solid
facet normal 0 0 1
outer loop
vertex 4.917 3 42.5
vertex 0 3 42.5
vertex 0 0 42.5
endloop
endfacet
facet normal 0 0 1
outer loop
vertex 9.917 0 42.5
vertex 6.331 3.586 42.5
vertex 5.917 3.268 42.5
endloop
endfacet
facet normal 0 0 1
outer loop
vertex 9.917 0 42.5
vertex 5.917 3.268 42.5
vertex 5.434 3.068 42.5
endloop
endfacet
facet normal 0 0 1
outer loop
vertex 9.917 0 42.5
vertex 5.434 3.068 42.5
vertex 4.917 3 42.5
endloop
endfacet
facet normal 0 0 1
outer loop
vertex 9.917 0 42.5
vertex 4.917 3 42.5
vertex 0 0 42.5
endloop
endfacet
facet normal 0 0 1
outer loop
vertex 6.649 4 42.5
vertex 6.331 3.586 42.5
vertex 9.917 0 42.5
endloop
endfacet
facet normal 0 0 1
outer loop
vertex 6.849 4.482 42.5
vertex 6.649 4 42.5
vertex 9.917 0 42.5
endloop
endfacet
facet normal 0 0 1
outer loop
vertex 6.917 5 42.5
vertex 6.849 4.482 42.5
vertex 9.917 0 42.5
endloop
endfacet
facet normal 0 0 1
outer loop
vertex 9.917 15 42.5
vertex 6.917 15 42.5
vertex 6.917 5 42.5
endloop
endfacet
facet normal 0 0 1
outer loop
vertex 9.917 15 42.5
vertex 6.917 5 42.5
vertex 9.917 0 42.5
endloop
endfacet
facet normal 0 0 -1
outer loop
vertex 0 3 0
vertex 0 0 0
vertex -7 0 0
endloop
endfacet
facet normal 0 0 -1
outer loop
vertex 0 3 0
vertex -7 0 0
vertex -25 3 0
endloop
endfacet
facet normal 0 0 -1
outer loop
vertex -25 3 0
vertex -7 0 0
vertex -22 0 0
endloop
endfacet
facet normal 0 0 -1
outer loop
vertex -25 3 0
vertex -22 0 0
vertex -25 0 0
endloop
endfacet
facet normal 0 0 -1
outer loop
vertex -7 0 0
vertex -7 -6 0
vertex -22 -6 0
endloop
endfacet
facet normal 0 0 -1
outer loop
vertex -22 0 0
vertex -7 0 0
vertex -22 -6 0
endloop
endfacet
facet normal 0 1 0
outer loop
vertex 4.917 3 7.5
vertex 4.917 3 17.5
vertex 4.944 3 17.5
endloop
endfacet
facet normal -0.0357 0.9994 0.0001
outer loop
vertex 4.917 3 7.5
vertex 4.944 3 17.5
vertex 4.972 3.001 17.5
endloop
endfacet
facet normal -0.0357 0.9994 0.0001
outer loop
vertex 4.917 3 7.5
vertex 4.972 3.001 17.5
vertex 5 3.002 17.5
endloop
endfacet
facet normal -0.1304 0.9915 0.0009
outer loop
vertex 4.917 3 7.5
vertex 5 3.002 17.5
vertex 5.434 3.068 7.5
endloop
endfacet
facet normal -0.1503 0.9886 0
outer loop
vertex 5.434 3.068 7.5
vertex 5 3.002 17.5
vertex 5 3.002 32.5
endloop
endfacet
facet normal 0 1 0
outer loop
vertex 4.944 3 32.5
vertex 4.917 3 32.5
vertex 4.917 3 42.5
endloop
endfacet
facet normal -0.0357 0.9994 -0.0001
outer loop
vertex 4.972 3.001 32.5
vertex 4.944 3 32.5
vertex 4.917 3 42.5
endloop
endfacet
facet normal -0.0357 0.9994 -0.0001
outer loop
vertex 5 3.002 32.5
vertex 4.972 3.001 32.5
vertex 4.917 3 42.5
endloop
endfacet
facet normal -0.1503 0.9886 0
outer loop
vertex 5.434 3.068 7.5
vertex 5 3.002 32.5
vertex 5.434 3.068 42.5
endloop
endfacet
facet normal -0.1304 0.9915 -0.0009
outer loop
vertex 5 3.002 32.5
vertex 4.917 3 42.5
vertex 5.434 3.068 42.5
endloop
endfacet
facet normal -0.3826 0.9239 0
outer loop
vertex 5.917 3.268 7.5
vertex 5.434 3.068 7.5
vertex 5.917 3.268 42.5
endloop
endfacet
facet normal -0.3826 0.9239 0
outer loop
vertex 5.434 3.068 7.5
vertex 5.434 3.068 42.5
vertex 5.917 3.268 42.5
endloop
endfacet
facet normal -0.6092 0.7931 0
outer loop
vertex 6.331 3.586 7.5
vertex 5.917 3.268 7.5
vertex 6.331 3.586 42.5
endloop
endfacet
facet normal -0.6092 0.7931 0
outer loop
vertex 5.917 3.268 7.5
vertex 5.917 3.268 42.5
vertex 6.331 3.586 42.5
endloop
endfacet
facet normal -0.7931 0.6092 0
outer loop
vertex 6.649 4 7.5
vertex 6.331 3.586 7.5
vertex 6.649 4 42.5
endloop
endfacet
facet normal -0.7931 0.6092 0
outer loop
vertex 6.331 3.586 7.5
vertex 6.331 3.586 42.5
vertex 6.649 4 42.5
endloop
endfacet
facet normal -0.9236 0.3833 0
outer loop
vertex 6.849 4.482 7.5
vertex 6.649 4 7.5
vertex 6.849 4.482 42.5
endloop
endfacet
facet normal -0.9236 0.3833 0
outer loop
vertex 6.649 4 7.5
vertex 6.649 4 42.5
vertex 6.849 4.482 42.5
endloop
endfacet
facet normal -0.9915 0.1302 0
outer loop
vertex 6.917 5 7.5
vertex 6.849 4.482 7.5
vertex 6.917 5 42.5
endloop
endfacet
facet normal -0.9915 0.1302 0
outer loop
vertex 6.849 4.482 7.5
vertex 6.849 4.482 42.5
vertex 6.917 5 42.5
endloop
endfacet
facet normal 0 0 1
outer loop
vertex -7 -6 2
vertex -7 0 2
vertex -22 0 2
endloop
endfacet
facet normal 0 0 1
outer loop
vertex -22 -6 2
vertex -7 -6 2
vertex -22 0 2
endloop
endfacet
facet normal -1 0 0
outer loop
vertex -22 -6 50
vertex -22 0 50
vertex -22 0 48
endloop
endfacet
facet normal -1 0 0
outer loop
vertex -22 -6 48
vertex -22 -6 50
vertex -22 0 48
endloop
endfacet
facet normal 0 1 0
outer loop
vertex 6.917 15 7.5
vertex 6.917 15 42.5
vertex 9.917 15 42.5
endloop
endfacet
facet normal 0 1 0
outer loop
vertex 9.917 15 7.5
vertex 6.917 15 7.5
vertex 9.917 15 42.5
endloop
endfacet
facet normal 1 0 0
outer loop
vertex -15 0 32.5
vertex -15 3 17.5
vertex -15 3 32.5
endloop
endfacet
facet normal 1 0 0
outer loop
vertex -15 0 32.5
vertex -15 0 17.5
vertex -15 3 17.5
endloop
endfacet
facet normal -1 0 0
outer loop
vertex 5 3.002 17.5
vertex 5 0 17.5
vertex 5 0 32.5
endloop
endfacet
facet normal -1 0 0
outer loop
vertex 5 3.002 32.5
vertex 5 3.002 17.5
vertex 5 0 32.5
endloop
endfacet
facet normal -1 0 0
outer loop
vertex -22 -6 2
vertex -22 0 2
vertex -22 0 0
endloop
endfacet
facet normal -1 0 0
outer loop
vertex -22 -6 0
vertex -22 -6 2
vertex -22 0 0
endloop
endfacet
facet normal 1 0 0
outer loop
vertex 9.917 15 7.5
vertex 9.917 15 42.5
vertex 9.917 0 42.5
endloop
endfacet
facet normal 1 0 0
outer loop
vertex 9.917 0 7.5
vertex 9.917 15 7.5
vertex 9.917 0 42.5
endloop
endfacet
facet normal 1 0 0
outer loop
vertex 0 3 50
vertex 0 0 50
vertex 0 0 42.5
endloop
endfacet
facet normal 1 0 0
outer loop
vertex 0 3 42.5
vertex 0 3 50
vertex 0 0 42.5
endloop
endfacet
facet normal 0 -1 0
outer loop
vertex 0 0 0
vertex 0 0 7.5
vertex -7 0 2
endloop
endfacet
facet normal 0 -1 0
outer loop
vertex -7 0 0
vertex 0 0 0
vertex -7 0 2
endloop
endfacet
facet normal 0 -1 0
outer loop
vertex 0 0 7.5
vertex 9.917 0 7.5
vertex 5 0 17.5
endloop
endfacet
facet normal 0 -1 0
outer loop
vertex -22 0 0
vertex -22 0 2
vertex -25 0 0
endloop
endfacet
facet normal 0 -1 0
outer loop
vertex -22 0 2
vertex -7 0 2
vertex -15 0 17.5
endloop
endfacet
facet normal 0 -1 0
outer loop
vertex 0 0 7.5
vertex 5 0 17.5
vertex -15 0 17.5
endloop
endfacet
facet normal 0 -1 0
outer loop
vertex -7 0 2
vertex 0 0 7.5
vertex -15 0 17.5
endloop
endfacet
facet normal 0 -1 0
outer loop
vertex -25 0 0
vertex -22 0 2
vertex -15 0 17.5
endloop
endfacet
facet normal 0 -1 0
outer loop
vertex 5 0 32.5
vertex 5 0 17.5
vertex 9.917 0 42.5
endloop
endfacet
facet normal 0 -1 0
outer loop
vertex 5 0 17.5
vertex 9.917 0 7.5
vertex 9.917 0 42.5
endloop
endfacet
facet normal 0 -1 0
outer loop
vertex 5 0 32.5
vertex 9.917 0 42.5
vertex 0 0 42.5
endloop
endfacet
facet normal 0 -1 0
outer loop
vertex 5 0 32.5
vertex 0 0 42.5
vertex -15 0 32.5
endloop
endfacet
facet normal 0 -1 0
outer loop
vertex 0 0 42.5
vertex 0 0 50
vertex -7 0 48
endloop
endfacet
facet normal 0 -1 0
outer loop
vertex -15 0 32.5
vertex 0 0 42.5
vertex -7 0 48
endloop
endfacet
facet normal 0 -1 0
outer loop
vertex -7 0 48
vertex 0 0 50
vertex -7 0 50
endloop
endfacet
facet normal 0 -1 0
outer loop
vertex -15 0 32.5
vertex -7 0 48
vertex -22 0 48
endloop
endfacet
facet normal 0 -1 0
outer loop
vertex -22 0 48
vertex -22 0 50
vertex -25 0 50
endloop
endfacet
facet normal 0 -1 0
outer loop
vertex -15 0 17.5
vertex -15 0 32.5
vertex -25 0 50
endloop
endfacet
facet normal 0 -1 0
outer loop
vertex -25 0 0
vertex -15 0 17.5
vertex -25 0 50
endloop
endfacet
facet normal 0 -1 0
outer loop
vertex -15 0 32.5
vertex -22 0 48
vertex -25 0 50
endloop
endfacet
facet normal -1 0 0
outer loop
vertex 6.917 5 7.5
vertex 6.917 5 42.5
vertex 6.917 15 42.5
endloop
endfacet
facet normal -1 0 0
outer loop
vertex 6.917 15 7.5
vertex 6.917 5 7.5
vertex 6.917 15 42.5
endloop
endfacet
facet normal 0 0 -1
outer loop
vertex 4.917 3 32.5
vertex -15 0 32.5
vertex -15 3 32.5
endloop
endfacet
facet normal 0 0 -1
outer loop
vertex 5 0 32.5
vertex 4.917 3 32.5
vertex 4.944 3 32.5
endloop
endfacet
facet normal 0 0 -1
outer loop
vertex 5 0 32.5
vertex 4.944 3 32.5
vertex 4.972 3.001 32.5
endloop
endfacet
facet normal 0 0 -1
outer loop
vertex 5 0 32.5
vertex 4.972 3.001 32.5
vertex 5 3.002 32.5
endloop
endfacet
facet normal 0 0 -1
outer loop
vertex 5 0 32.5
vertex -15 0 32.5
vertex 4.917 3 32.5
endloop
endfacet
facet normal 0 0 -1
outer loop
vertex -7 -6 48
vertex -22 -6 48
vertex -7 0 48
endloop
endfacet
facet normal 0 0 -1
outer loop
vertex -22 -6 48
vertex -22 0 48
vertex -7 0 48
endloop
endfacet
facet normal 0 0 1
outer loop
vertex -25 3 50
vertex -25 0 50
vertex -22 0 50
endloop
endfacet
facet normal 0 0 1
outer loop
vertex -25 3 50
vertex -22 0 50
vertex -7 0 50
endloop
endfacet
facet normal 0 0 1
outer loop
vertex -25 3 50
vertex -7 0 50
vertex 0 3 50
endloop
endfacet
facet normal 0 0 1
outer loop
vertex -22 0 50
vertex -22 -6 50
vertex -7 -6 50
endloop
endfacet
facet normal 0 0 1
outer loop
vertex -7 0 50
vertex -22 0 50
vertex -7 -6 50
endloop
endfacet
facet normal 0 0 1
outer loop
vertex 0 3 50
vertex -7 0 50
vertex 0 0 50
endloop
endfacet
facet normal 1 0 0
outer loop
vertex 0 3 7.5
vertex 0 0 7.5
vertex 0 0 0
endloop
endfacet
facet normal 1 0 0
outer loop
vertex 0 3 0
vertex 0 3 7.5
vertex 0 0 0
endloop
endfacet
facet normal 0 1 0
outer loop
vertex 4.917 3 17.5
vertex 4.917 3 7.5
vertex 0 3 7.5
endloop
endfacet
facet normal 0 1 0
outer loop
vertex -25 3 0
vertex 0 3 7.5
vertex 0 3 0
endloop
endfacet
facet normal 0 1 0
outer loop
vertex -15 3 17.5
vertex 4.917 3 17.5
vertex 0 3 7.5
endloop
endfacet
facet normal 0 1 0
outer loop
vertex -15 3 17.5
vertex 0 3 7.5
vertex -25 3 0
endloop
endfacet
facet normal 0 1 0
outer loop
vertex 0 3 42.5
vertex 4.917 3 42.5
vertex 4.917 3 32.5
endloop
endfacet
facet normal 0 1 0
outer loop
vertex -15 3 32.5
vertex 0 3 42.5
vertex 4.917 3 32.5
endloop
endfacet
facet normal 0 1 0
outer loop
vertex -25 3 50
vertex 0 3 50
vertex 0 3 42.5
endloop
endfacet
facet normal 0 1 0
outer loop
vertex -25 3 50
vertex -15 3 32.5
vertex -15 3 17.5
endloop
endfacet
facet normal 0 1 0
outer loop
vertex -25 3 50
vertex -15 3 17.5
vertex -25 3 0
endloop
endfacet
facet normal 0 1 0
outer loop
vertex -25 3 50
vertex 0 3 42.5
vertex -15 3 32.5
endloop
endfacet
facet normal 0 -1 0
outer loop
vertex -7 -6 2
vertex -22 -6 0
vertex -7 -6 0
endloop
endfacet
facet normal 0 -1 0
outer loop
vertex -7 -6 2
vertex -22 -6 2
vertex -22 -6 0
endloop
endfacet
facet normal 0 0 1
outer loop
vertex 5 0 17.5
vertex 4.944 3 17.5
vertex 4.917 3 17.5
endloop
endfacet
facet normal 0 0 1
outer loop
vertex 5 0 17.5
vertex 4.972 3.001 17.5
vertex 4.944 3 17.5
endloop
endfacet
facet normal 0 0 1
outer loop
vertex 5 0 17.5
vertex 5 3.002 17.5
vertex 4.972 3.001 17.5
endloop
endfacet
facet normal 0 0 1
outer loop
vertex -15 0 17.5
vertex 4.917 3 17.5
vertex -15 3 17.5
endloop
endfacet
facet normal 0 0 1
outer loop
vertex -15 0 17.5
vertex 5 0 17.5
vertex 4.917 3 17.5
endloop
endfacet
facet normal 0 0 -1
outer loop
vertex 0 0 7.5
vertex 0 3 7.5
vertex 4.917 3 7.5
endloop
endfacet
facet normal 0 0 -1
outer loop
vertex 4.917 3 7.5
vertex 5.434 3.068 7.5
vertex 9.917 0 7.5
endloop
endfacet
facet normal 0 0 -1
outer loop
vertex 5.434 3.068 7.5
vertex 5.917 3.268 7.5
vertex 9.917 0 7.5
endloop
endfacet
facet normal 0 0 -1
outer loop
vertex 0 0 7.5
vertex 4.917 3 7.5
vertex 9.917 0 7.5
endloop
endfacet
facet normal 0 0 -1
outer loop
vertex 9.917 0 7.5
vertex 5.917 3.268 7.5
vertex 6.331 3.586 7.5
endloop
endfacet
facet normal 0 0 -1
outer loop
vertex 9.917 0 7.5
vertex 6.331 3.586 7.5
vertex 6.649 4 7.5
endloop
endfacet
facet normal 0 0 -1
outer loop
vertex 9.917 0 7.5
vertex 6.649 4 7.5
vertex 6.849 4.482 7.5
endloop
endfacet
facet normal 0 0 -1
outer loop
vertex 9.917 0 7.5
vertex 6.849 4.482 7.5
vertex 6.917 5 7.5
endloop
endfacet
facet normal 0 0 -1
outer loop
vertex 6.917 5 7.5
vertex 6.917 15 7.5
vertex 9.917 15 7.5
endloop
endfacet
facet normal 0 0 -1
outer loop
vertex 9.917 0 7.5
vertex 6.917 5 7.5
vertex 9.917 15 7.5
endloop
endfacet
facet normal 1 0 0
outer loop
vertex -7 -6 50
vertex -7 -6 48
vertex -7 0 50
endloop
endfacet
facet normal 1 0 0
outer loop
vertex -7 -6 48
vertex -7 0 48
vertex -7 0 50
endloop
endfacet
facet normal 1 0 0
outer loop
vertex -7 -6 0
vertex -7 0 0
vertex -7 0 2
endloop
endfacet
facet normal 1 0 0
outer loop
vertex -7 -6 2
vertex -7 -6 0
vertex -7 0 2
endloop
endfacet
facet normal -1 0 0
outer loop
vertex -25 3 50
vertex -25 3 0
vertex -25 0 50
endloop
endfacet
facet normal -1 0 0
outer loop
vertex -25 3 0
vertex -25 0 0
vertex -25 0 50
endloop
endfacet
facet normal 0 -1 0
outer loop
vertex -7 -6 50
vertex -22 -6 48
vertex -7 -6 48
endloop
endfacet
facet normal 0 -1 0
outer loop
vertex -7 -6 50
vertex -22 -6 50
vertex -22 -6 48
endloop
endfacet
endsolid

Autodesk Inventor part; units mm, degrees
ref_plane "YZ Plane" through (0, 0, 0) normal (1, 0, 0) x (0, 1, 0)
ref_plane "XZ Plane" through (0, 0, 0) normal (0, 1, 0) x (-1, 0, 0)
ref_plane "XY Plane" through (0, 0, 0) normal (0, 0, 1) x (1, 0, 0)
sketch "Skizze1" plane through (0, 0, 0) normal (0, 1, 0) x (-1, 0, 0)
  line L0 (0, 0) -> (25, 0)
  line L1 (25, 0) -> (25, 50)
  line L2 (25, 50) -> (0, 50)
  line L3 (0, 42.5) -> (-9.9167, 42.5)
  line L4 (-9.9167, 42.5) -> (-9.9167, 7.5)
  line L5 (-9.9167, 7.5) -> (0, 7.5)
  line L6 (15, 32.5) -> (-5, 32.5)
  line L7 (-5, 32.5) -> (-5, 17.5)
  line L8 (-5, 17.5) -> (15, 17.5)
  line L9 (15, 17.5) -> (15, 32.5)
  line L10 (0, 7.5) -> (0, 17.5)
  line L11 (0, 32.5) -> (0, 42.5)
  line L12 (0, 50) -> (0, 32.5)
  line L13 (0, 17.5) -> (0, 0)
  dimension "d0" = 50
  dimension "d1" = 25
  dimension "d2" = 7.5
  dimension "d4" = 35
  dimension "d5" = 10
  dimension "d6" = 15
  dimension "d8" = 20
  dimension "d9" = 15
extrude "Extrusion1" add sketch "Skizze1" along normal blind 3 contours L13 L10 L8 L9 L6 L11 L12 L2 L1 L0 | L5 L4 L3 L11 L6 L7 L8 L10
sketch "Skizze2" plane through (0, 0, 42.5) normal (0, 0, 1) x (1, 0, 0)
  line L0 (9.9167, 0) -> (9.9167, 3) projected
  line L1 (9.9167, 3) -> (6.9167, 3)
  line L2 (6.9167, 3) -> (6.9167, 15)
  line L3 (6.9167, 15) -> (9.9167, 15)
  line L4 (9.9167, 15) -> (9.9167, 3)
  point P0 (0, 0)
  dimension "d12" = 3
  dimension "d13" = 12
extrude "Extrusion2" add sketch "Skizze2" against normal up to surface (35 mm away)
fillet "Rundung1" radius 2 1 edges at (6.9167, 3, 25)
sketch "Skizze3" plane through (0, 0, 0) normal (0, -1, 0) x (1, 0, 0)
  line L0 (-22, 0) -> (-7, 0)
  line L1 (-7, 0) -> (-7, 2)
  line L2 (-7, 2) -> (-22, 2)
  line L3 (-22, 2) -> (-22, 0)
  line L4 (-22, 48) -> (-7, 48)
  line L5 (-7, 48) -> (-7, 50)
  line L6 (-7, 50) -> (-22, 50)
  line L7 (-22, 50) -> (-22, 48)
  line L8 (-25, 50) -> (0, 50) projected
  line L9 (0, 50) -> (0, 42.5) projected
  point P0 (0, 0)
  dimension "d17" = 2
  dimension "d18" = 2
  dimension "d19" = 46
  dimension "d20" = 15
  dimension "d21" = 15
  dimension "d22" = 0
  dimension "d23" = 7
extrude "Extrusion3" add sketch "Skizze3" along normal blind 6
properties part number "Ultrasonic" material "Stahl, Guss"
